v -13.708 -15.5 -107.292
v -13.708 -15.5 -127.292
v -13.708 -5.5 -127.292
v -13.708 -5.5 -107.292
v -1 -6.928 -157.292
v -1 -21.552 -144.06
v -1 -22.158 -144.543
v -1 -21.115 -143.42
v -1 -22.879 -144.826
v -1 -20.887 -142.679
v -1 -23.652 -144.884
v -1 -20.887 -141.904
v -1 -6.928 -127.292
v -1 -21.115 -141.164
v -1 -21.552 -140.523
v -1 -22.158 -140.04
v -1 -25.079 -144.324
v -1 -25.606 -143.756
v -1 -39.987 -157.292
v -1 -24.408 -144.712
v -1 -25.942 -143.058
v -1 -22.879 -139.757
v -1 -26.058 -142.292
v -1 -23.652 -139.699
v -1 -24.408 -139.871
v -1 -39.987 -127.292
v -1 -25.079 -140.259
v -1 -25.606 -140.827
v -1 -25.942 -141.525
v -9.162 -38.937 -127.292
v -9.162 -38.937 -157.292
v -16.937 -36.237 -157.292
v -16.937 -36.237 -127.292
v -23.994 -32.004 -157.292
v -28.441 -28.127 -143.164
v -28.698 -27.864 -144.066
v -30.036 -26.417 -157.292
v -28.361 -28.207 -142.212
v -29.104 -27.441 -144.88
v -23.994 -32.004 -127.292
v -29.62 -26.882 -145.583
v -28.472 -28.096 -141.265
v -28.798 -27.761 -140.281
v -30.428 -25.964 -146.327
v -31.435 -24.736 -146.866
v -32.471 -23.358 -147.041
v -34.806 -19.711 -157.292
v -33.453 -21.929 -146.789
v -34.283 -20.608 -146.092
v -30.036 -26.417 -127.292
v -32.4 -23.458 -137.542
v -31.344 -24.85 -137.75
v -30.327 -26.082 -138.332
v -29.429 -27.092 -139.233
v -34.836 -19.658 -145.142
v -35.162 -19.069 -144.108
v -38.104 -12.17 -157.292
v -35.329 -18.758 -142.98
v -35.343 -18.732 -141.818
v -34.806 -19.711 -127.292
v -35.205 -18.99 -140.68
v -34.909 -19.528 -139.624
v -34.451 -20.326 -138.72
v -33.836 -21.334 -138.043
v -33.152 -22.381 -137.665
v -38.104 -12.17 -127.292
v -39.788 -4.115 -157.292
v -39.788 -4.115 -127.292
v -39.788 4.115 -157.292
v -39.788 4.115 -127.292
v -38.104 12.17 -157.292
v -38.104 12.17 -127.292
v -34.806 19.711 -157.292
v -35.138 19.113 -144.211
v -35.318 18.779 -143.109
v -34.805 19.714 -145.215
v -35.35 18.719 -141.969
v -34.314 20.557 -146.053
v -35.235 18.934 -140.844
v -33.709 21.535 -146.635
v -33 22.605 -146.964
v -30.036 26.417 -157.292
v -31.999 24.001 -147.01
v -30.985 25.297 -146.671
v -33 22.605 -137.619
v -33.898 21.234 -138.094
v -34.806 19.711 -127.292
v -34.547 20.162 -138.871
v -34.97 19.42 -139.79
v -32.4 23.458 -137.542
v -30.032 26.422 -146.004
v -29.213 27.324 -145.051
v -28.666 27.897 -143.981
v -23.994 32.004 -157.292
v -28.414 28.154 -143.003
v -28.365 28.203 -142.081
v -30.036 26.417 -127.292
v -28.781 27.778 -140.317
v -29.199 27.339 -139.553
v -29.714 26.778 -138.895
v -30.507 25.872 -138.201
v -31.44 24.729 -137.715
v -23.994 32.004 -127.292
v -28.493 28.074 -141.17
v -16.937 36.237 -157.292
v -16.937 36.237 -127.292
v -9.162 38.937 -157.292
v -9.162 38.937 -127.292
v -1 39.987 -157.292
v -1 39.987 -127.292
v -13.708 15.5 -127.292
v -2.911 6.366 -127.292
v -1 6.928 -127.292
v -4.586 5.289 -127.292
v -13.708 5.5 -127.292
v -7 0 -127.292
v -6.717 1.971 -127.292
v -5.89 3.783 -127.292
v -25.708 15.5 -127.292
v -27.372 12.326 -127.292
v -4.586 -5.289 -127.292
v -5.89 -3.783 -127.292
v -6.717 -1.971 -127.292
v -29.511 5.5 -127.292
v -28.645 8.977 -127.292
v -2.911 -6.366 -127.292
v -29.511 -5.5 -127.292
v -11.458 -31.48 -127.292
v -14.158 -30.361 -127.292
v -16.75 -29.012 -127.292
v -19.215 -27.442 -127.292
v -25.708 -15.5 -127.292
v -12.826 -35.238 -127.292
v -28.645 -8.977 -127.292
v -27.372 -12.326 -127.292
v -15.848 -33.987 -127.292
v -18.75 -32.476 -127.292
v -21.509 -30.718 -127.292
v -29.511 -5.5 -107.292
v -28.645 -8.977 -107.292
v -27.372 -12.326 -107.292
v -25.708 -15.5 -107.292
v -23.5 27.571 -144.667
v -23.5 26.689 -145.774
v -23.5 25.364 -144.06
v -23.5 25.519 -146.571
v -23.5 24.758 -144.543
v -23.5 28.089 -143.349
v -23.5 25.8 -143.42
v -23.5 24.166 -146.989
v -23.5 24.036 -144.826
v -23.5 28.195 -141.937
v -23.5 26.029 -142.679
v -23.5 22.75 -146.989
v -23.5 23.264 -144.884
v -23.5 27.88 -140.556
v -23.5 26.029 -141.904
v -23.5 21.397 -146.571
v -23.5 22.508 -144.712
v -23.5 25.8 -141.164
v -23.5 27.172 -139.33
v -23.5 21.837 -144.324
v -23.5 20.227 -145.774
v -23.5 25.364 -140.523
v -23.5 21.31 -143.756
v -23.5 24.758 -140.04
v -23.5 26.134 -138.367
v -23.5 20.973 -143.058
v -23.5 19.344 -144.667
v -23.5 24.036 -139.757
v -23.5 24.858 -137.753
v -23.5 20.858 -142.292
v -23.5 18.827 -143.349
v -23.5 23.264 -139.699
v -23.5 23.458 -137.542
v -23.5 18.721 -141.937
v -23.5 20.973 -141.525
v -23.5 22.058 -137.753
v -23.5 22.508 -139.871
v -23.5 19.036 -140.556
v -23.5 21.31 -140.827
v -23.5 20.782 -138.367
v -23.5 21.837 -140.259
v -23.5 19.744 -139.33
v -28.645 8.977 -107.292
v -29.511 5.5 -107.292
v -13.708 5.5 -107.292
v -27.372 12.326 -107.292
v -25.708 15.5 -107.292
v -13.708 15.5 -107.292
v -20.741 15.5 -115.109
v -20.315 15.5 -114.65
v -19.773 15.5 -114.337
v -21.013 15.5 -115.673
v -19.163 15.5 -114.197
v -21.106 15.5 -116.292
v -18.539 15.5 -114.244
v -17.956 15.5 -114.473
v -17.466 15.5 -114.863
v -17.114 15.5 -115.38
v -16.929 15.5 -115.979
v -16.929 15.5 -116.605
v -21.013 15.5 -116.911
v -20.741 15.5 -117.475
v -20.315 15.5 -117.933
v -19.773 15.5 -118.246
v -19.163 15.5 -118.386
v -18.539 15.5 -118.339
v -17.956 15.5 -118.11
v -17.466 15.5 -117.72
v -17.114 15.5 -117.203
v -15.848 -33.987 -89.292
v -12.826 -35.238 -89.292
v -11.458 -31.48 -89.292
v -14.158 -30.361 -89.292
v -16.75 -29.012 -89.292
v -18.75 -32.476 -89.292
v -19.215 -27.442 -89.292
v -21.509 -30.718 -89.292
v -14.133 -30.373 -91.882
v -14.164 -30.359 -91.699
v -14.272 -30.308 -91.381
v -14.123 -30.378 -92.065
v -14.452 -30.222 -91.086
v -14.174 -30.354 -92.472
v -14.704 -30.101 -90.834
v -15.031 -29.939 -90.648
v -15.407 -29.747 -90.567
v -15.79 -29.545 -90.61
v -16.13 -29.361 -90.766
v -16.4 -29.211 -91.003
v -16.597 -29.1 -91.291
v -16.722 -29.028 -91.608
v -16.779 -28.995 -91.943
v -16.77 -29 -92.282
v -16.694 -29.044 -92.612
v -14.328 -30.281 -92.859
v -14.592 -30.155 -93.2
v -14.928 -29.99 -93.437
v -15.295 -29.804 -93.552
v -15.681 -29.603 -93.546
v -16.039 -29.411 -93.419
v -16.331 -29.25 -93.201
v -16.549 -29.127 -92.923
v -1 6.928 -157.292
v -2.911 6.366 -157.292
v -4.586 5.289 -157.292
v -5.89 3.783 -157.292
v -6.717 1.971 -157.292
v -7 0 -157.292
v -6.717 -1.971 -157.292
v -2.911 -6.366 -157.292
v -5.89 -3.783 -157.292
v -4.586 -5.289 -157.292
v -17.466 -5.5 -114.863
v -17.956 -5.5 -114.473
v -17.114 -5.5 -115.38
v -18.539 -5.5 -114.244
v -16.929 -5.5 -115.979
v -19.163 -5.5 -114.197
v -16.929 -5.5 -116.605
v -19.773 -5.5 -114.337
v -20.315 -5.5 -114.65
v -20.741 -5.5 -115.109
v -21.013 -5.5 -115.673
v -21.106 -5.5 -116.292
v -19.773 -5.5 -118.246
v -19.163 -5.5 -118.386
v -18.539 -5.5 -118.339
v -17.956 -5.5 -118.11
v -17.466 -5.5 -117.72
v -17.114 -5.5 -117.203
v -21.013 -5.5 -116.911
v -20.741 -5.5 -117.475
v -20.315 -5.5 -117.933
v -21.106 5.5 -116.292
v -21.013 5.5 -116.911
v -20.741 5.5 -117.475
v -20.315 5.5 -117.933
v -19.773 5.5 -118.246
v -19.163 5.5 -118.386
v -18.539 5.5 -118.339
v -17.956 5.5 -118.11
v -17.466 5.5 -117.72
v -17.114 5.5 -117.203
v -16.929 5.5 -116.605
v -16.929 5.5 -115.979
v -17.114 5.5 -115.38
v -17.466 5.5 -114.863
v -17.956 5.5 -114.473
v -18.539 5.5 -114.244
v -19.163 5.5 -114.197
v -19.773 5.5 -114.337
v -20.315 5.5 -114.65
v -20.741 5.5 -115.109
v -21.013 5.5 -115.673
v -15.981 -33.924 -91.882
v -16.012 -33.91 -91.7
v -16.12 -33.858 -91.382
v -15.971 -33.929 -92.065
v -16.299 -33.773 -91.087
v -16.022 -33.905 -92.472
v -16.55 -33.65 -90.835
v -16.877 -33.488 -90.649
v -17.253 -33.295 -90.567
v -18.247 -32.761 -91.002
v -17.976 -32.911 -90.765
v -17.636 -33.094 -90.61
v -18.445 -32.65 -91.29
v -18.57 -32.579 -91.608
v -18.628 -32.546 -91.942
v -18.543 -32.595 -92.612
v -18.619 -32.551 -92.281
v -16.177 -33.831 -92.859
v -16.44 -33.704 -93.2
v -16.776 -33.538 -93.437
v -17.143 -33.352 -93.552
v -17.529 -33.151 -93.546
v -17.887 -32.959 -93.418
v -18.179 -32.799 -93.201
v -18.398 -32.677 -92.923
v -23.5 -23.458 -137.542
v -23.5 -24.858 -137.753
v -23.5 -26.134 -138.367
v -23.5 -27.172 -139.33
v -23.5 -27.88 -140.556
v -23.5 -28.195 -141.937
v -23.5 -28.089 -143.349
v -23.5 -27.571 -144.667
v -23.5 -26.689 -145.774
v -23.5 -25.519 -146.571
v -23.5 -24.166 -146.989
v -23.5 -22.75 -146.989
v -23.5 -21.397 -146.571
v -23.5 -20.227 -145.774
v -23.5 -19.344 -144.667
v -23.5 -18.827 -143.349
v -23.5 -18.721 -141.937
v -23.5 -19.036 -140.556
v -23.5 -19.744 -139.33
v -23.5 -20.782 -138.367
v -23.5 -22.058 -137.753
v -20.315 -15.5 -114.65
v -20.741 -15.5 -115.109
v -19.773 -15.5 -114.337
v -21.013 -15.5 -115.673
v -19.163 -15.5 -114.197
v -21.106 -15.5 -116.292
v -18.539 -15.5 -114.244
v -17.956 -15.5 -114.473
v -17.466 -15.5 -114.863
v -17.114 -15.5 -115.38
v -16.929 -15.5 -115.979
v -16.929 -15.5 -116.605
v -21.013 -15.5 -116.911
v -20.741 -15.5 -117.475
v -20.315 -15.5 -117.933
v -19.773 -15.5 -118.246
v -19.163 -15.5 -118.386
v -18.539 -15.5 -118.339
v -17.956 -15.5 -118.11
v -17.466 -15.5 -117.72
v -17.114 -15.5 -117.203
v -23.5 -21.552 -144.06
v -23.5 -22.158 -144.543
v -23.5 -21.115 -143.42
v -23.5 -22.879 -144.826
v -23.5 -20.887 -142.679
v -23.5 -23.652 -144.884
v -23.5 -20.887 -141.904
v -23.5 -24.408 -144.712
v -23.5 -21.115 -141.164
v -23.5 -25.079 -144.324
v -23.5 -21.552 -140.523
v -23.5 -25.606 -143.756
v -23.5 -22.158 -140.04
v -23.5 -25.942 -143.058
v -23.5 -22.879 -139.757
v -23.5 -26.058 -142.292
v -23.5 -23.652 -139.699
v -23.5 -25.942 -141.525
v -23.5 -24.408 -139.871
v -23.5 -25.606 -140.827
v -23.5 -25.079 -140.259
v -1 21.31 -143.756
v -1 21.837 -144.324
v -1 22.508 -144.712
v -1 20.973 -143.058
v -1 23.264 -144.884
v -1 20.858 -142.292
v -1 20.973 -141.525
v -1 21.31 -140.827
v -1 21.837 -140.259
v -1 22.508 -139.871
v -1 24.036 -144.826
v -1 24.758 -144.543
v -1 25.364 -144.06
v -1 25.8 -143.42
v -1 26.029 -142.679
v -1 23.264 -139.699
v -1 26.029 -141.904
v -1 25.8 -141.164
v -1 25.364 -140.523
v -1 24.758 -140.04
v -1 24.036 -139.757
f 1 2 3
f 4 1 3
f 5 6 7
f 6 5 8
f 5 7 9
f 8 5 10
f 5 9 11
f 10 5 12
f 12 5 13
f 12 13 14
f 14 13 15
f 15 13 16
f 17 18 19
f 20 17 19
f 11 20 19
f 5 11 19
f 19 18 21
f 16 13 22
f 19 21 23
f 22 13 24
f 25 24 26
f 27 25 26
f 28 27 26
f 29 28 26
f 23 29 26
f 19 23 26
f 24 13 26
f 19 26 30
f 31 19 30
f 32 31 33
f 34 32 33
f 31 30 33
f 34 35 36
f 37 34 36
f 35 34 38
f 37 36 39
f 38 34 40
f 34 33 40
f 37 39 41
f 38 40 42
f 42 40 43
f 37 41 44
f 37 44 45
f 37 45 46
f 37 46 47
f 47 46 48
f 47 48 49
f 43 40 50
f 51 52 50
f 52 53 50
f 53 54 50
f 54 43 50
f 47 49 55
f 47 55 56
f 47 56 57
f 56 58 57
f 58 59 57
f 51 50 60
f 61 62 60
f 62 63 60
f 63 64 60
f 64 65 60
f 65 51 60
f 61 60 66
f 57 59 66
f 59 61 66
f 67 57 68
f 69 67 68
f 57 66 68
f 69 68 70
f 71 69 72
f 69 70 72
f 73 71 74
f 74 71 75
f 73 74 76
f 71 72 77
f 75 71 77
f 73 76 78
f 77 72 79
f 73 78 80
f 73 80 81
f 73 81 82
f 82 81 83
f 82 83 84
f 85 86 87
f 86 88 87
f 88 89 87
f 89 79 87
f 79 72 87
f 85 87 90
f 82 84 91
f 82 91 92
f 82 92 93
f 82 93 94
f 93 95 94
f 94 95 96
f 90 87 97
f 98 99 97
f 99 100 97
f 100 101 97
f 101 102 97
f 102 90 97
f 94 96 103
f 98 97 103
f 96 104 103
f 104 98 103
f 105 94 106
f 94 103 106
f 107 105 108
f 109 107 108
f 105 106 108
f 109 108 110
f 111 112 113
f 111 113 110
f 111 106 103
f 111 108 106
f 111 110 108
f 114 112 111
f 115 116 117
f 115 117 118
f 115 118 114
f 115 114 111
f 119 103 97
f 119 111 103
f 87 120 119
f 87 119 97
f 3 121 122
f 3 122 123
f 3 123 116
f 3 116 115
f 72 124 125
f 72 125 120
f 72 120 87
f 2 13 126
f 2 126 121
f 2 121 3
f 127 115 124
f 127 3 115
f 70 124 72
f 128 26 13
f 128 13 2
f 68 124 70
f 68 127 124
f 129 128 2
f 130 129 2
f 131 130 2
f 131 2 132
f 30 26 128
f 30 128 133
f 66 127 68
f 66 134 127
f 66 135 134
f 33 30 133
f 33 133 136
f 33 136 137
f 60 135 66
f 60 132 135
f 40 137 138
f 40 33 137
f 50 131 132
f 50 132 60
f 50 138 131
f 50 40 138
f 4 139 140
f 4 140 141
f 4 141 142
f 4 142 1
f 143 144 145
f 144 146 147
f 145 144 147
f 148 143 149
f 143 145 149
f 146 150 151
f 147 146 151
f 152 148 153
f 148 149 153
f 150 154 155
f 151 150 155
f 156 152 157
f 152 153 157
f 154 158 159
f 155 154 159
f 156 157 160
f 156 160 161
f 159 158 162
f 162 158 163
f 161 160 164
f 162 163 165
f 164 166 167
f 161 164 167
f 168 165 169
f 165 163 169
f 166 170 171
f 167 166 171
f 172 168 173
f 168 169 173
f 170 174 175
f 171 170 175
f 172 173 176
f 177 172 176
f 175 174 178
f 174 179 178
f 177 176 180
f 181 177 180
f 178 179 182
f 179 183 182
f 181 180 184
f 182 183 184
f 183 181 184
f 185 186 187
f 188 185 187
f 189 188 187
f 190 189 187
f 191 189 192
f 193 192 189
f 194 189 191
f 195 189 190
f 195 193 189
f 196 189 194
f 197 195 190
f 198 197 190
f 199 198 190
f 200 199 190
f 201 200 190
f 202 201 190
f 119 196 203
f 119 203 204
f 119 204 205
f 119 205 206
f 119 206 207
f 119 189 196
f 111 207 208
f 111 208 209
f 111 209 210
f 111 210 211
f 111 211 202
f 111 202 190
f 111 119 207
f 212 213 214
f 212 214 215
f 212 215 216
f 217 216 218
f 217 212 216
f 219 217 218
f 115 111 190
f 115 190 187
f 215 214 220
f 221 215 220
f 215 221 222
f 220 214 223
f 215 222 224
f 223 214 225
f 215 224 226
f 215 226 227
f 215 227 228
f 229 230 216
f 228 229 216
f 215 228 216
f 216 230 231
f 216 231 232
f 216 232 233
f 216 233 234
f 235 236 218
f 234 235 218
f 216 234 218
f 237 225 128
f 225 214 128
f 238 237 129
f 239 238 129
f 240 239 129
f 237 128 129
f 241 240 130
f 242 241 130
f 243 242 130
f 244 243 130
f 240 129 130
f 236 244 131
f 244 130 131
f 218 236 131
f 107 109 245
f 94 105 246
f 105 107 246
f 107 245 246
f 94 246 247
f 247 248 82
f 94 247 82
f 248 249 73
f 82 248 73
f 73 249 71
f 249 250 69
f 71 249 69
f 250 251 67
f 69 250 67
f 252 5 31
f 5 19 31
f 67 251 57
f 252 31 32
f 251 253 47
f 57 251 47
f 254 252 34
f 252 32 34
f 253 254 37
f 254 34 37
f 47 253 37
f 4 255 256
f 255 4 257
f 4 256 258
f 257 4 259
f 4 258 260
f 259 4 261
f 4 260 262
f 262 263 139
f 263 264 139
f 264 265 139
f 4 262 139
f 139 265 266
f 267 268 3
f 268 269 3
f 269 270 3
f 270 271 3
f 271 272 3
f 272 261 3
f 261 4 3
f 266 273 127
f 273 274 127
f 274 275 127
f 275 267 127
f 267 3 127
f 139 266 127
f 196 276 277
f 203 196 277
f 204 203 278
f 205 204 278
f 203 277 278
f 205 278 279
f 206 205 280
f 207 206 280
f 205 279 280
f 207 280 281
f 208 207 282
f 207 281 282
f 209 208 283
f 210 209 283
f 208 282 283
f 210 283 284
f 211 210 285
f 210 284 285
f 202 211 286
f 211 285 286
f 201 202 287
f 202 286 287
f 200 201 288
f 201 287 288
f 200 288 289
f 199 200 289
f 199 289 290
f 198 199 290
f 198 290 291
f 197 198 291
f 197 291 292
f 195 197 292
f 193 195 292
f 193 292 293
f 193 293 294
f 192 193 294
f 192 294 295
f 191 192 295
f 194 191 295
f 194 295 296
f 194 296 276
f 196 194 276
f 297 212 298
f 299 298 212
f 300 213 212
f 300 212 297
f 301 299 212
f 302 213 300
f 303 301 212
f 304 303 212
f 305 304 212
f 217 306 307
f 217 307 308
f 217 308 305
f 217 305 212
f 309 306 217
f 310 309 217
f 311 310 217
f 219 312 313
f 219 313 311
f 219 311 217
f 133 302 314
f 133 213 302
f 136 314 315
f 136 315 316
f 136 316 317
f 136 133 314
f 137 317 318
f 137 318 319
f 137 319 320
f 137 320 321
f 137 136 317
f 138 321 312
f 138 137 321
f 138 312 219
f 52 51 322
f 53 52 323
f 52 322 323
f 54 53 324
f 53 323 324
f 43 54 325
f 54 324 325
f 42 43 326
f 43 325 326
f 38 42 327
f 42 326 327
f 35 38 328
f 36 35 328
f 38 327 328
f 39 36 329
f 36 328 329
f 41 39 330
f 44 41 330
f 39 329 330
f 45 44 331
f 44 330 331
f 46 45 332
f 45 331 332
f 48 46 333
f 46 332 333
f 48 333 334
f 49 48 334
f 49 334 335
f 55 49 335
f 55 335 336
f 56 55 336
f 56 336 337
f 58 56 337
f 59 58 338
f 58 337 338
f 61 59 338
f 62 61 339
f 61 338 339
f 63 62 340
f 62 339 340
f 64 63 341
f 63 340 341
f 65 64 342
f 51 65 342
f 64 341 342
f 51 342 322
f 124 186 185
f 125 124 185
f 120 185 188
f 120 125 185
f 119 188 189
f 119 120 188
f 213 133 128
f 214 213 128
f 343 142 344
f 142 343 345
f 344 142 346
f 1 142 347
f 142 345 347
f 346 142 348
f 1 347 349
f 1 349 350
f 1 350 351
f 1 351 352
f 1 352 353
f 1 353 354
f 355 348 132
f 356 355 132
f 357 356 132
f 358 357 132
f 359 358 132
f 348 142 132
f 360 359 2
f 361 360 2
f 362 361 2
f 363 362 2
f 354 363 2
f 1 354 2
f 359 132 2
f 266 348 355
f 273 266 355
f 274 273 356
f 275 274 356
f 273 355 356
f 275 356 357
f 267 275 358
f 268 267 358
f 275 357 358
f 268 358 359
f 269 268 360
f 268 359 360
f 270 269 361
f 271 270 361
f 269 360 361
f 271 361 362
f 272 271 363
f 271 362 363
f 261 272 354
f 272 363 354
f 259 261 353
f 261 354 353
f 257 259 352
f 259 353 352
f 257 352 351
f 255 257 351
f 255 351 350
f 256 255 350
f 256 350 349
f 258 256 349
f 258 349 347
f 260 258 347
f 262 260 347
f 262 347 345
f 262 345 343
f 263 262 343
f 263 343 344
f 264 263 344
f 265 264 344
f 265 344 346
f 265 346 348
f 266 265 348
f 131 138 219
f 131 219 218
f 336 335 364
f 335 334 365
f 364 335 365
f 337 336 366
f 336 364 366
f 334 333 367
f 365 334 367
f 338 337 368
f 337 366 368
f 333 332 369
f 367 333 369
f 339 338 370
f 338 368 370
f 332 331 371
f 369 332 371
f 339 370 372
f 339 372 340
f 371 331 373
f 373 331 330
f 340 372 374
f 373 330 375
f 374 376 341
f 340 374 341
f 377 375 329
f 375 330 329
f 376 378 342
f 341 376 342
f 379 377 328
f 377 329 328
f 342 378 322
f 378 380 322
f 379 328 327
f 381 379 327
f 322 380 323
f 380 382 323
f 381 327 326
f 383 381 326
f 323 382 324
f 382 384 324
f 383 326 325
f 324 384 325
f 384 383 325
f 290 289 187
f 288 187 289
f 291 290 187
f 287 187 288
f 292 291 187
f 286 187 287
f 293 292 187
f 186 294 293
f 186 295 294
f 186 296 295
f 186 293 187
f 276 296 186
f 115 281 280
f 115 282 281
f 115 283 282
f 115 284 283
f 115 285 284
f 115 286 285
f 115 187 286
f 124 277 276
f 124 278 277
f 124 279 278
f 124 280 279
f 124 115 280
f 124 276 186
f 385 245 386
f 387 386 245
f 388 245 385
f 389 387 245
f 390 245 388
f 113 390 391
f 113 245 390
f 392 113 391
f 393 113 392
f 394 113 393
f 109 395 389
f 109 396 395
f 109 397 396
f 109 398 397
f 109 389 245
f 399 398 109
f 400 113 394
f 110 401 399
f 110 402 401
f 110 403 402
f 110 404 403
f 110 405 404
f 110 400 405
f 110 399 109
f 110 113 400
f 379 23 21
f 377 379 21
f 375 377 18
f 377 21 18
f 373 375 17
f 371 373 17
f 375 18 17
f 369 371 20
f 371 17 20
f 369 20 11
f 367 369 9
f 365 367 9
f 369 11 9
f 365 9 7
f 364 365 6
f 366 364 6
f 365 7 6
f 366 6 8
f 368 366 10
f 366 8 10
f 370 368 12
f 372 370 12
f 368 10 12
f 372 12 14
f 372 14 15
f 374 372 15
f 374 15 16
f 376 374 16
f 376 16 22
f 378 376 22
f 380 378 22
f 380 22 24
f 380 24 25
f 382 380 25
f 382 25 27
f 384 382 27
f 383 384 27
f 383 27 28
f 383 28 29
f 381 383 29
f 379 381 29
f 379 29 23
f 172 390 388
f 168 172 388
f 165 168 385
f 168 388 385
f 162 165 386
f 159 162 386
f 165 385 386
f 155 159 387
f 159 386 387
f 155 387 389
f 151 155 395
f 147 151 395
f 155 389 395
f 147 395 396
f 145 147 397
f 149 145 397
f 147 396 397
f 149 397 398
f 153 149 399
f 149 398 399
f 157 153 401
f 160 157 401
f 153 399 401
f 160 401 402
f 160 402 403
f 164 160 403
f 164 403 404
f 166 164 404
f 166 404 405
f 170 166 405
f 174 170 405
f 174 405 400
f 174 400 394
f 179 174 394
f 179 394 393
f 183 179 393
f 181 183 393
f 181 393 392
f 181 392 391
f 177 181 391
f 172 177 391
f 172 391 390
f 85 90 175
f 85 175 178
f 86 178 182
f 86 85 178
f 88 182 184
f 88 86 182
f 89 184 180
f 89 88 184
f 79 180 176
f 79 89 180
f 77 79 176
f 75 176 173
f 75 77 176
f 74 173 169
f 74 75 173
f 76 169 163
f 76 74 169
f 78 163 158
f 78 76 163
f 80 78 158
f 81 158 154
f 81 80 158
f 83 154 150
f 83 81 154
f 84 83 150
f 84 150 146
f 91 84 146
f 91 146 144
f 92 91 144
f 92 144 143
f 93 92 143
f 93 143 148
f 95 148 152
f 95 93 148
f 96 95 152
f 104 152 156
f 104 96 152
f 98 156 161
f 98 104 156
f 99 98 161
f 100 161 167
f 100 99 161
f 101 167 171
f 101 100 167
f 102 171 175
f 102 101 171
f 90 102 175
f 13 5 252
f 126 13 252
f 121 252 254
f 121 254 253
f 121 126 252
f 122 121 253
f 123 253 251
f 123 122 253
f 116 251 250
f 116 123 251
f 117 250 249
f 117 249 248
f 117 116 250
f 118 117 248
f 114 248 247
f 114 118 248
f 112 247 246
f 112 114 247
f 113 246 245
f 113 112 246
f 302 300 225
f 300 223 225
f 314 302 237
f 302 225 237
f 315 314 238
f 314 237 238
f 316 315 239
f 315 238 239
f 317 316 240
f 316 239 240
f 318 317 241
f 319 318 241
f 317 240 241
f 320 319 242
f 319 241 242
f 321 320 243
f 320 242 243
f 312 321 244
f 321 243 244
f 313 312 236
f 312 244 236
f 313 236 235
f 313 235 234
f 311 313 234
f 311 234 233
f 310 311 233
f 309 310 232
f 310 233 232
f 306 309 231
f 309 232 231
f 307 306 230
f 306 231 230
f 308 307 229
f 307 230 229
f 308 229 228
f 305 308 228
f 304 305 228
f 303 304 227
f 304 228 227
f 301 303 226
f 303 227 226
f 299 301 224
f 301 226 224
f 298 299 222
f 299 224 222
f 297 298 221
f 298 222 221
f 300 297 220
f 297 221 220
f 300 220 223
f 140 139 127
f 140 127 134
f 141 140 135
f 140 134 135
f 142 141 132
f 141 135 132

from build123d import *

# Parameters (mm, degrees)
PAD004_DEPTH    = 30
PAD005_DEPTH    = 20
SKETCH019_R     = 2.1
POCKET007_DEPTH = 55.4884980464
SKETCH020_R     = 2.6
POCKET008_DEPTH = 39.001
SKETCH021_R     = 4.75
POCKET009_DEPTH = 9.5
PAD007_DEPTH    = 38
SKETCH026_R     = 1.5
POCKET012_DEPTH = 4


with BuildPart() as part:
    # Sketch017 (on DatumPlane) → Pad004 (new body)
    with BuildSketch(Plane(origin=(0, 0, -127.29162), x_dir=(1, 0, 0), z_dir=(0, 0, -1))):
        with BuildLine():
            ThreePointArc((-1, 6.9282032303), (-7, 0), (-1, -6.9282032303))
            Line((-1, -6.9282032303), (-1, -39.9874980463))
            ThreePointArc((-1, 39.9874980463), (-40, 0), (-1, -39.9874980463))
            Line((-1, 6.9282032303), (-1, 39.9874980463))
        make_face()
    extrude(amount=PAD004_DEPTH)

    # Sketch018 (on Face5 of Pad004) → Pad005 (join)
    with BuildSketch(Plane.XY.offset(-127.29162)):
        with BuildLine():
            ThreePointArc((-29.5109069739, -5.5), (-28.0584714971, -10.6707922701), (-25.7078515326, -15.5))
            Line((-25.7078515327, -15.5), (-13.7078515327, -15.5))
            Line((-13.7078515327, -15.5), (-13.7078515327, -5.5))
            Line((-13.7078515327, -5.5), (-29.5109069739, -5.5))
        make_face()
    pad005 = extrude(amount=PAD005_DEPTH)

    # Mirrored: Pad005 across Sketch018 H_Axis
    add(pad005.mirror(Plane(origin=(0, 0, -127.29162), x_dir=(0, 0, 1), z_dir=(0, 1, 0))))

    # Sketch019 (on Face10 of Mirrored) → Pocket007 (cut, through all)
    with BuildSketch(Plane(origin=(0, -15.5, -127.29162), x_dir=(-1, 0, 0), z_dir=(0, -1, 0))):
        with Locations((19.005882937, -11)):
            Circle(SKETCH019_R)
    extrude(amount=-POCKET007_DEPTH, mode=Mode.SUBTRACT)

    # Sketch020 (on Face2 of Pocket007) → Pocket008 (cut, through all)
    with BuildSketch(Plane(origin=(-1, 0, -127.29162), x_dir=(0, -1, 0), z_dir=(1, 0, 0))):
        with Locations((-23.4578506383, 15)):
            Circle(SKETCH020_R)
        with Locations((23.4578506383, 15)):
            Circle(SKETCH020_R)
    extrude(amount=-POCKET008_DEPTH, mode=Mode.SUBTRACT)

    # Sketch021 (on DatumPlane) → Pocket009 (cut, symmetric)
    with BuildSketch(Plane(origin=(-33, -23.4578506383, -142.29162), x_dir=(0, 0, 1), z_dir=(1, 0, 0))):
        with Locations((0, -46.9157012765)):
            Circle(SKETCH021_R)
        Circle(SKETCH021_R)
    extrude(amount=POCKET009_DEPTH, both=True, mode=Mode.SUBTRACT)

    # Sketch025 (on DatumPlane) → Pad007 (join)
    with BuildSketch(Plane(origin=(0, 0, -127.29162), x_dir=(1, 0, 0), z_dir=(0, 0, -1))):
        with BuildLine():
            Line((-12.8257553747, 35.2384732795), (-11.4576748014, 31.4797027963))
            ThreePointArc((-11.4576748014, 31.4797027963), (-15.4685785433, 29.7148629115), (-19.2148106176, 27.4415934838))
            Line((-21.509116363, 30.7182016609), (-19.2148106176, 27.4415934838))
            ThreePointArc((-12.8257553747, 35.2384732795), (-17.3155729962, 33.2629062442), (-21.509116363, 30.7182016609))
        make_face()
    extrude(amount=-PAD007_DEPTH)

    # Sketch026 (on DatumPlane) → Pocket012 (cut, symmetric)
    with BuildSketch(Plane(origin=(-17.2661657333, -33.1679957752, -108.29162), x_dir=(0.8870108332, -0.4617486132, 0), z_dir=(0.4617486132, 0.8870108332, 0))):
        with Locations((0, -16.226432)):
            Circle(SKETCH026_R)
    extrude(amount=POCKET012_DEPTH, both=True, mode=Mode.SUBTRACT)


solid = part.part
